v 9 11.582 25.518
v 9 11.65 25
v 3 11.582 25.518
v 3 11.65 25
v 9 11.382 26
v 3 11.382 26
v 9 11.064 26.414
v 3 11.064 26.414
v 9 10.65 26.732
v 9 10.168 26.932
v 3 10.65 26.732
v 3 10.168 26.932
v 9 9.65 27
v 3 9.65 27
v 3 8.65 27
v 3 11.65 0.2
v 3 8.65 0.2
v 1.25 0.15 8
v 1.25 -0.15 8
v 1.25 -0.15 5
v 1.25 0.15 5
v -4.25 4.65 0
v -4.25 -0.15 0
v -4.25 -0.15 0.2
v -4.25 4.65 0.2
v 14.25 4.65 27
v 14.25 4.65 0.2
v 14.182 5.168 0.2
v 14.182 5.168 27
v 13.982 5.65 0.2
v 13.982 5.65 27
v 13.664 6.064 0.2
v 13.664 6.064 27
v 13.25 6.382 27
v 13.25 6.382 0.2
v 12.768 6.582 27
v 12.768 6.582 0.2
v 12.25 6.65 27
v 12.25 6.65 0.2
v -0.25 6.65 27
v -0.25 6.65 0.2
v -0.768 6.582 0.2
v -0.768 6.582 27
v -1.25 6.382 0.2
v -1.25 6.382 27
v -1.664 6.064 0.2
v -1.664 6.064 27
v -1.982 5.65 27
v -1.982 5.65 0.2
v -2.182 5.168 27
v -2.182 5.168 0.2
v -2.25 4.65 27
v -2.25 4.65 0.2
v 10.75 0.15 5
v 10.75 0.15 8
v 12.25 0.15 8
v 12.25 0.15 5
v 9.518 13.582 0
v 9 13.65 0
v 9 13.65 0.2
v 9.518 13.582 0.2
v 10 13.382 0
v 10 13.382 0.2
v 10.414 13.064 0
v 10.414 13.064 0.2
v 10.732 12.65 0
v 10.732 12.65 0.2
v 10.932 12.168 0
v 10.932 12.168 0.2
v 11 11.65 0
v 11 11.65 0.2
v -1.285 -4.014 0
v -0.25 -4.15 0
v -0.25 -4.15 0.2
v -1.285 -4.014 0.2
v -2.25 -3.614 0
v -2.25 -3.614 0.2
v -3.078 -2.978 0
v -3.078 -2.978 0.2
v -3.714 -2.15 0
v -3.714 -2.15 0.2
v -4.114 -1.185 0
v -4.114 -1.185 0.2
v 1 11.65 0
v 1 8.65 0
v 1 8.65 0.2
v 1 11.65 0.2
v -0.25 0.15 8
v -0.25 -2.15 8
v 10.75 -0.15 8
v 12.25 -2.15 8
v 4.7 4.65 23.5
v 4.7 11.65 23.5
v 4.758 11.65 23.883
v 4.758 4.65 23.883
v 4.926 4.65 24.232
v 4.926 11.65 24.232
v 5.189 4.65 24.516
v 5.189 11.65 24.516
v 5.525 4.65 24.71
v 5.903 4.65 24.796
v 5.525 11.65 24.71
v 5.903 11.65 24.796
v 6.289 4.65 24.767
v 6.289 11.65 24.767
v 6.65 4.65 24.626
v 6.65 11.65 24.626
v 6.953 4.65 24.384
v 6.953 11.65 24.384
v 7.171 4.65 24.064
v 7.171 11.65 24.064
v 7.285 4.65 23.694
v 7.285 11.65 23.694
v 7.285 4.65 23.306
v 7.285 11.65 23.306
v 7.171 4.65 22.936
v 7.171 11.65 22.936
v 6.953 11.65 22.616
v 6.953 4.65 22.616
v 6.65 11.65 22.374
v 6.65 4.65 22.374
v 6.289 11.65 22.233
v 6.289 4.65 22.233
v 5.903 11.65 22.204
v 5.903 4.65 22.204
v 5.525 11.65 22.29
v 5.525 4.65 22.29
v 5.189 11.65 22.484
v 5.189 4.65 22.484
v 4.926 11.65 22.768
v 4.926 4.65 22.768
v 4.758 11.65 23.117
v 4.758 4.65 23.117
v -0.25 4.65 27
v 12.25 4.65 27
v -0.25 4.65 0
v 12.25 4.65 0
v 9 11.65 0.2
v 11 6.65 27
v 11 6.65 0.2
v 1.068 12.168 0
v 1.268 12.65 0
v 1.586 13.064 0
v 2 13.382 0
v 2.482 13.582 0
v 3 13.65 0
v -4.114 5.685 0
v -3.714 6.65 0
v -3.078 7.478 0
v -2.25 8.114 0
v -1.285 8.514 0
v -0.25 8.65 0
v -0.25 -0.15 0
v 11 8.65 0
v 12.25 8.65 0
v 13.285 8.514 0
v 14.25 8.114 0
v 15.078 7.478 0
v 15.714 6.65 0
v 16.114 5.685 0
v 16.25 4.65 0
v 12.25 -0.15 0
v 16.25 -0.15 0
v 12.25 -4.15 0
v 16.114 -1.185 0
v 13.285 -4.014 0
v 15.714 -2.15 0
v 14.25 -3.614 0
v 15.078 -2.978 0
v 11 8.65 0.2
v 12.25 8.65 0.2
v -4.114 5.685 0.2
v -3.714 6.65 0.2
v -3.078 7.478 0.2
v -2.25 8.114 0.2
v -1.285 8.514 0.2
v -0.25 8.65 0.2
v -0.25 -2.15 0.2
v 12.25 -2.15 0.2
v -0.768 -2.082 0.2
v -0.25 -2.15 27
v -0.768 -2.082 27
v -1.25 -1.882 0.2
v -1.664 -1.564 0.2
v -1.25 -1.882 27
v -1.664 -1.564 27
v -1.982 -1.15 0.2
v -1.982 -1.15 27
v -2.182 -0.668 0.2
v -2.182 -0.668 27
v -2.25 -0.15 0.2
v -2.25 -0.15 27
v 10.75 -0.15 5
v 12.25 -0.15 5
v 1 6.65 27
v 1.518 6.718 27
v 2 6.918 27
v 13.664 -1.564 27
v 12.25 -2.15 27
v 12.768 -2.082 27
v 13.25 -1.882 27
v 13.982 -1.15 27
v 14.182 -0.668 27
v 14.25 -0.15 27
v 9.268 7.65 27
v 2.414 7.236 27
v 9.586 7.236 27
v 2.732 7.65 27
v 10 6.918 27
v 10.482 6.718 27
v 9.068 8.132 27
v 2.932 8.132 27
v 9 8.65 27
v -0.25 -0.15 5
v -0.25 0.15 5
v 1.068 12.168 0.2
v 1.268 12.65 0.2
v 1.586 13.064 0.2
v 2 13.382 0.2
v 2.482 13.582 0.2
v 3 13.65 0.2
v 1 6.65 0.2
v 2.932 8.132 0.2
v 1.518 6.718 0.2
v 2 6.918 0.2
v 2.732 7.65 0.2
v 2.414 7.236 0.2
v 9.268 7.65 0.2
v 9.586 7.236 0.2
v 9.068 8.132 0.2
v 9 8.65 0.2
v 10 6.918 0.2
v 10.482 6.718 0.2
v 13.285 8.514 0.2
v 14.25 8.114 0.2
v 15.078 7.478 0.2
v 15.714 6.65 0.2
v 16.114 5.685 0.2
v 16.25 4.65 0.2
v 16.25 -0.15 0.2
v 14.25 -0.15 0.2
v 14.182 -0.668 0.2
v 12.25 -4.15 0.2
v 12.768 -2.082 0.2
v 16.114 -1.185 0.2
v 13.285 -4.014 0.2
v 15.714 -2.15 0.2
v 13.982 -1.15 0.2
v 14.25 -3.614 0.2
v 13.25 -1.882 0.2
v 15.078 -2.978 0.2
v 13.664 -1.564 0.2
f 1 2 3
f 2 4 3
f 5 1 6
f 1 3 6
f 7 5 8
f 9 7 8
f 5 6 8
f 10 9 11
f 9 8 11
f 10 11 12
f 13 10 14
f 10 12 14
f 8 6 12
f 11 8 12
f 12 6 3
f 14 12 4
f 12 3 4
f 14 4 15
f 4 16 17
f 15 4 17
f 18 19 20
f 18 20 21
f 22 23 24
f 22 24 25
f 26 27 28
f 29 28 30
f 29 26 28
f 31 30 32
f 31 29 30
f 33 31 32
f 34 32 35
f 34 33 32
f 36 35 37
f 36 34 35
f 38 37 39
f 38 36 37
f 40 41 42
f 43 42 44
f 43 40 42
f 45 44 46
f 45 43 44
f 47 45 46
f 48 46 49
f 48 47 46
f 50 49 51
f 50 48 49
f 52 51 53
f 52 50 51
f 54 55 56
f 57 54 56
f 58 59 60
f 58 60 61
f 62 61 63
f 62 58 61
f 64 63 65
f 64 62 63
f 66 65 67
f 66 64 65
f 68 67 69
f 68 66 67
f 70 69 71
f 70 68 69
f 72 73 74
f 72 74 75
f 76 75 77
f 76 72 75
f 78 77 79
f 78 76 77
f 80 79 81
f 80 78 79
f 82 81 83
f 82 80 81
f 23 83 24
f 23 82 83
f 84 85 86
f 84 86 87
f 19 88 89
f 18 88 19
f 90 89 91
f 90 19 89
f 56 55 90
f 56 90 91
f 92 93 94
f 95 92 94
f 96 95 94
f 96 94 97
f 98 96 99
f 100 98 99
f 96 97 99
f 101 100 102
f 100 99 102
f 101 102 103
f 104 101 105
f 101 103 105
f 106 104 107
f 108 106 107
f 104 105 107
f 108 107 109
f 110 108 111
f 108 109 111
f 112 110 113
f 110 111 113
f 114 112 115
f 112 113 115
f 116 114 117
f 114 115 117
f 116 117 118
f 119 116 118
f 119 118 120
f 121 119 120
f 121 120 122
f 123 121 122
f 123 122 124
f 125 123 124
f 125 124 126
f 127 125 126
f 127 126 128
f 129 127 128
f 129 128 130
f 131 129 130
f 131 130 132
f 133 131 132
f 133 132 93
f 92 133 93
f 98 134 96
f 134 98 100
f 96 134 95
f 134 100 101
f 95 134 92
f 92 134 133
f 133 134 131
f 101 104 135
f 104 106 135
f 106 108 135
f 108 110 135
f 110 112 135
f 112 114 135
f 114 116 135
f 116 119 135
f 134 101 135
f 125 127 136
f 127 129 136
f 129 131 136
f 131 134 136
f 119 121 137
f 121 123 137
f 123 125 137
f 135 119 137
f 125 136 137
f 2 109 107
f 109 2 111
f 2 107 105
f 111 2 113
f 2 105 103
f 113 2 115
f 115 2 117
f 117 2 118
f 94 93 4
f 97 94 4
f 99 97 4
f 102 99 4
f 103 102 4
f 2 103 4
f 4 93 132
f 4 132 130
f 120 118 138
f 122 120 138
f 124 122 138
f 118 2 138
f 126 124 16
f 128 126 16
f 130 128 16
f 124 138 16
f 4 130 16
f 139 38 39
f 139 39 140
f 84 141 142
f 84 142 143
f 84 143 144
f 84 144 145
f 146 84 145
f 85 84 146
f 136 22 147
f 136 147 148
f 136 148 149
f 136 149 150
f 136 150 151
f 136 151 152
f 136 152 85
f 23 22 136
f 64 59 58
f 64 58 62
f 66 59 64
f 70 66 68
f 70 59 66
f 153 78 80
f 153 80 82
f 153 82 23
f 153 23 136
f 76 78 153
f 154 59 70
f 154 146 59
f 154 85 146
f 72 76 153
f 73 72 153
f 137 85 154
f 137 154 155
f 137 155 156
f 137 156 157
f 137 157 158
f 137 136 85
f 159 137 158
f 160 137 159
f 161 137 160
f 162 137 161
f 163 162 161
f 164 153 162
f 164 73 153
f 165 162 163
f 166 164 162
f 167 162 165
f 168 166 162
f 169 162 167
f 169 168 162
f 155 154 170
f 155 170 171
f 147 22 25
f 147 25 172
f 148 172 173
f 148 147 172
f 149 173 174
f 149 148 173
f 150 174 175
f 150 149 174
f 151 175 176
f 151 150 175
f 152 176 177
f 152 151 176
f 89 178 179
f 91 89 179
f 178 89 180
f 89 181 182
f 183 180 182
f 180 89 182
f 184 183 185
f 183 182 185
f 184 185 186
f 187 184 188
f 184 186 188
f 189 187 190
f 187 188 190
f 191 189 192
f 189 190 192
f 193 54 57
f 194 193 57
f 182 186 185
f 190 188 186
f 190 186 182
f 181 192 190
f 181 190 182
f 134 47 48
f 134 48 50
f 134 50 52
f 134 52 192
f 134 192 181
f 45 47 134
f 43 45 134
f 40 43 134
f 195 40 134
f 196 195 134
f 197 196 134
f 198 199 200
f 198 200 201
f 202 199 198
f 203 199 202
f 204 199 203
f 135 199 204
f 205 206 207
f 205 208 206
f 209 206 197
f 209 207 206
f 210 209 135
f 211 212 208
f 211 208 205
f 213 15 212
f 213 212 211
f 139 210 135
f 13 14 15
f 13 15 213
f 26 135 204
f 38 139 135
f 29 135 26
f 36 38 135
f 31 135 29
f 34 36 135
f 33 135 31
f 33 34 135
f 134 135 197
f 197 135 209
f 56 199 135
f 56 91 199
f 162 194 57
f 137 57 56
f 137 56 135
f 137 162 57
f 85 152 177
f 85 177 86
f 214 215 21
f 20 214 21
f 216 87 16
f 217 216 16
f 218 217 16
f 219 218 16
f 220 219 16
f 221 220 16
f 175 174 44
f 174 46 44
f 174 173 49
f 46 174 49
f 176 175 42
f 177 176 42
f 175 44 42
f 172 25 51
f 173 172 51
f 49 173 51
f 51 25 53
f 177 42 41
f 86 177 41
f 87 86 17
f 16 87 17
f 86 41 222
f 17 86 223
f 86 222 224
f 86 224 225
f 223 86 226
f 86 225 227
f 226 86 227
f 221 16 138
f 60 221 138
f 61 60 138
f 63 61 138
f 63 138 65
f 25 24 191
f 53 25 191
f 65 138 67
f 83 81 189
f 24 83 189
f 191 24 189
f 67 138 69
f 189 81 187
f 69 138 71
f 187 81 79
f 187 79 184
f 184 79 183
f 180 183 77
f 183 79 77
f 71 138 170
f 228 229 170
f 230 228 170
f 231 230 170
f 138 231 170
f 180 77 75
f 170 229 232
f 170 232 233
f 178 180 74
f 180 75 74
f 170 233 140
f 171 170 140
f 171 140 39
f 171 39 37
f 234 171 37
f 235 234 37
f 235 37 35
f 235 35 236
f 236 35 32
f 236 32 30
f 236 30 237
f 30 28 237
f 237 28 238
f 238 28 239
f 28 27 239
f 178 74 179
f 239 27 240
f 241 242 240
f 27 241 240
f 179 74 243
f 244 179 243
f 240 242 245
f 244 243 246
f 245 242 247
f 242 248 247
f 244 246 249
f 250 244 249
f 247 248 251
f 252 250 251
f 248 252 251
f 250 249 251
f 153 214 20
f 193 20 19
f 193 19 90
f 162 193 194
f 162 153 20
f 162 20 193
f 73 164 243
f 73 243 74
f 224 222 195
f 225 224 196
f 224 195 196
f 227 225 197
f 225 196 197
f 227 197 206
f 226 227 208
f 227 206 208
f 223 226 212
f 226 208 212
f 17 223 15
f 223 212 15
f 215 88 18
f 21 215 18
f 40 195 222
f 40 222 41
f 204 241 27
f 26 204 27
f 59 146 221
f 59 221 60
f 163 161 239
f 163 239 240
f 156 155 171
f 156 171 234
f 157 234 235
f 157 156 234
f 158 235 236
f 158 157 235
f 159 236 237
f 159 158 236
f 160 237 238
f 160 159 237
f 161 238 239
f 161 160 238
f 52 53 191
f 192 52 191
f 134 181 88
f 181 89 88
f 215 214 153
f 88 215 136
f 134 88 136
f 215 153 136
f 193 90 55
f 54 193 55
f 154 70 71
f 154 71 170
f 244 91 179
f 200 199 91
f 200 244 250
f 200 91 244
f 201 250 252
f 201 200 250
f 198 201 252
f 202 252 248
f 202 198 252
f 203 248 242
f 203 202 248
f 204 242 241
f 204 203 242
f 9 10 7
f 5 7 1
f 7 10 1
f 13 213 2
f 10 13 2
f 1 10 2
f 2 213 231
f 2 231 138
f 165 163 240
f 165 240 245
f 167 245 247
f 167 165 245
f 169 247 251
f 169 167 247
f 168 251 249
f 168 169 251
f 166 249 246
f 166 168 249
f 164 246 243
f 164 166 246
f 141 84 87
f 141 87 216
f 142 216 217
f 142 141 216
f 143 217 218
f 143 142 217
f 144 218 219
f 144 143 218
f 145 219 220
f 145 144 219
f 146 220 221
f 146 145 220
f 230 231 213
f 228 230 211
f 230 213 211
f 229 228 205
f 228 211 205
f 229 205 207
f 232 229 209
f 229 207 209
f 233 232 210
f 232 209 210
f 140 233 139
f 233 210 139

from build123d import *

# Parameters (mm, degrees)
F0_W      = 12.5
F0_H      = 4.8
F1_DEPTH  = 27
F2_W      = 12.5
F2_H      = 6.8
F3_DEPTH  = 19
F4_W      = 1.5
F4_H      = 0.3
F5_DEPTH  = 3
F6_R      = 1.3
F7_DEPTH  = 13.801
F8_R      = 2
F10_DEPTH = 0.2


with BuildPart() as f1:
    # F0 (on Top) → F1 (new body)
    with BuildSketch(Plane.XY):
        Polygon((3, 6.65), (-2.25, 6.65), (-2.25, -2.15), (14.25, -2.15), (14.25, 6.65), (9, 6.65), (9, 11.65), (3, 11.65), align=None)
        with Locations((6, 2.25)):
            Rectangle(F0_W, F0_H, mode=Mode.SUBTRACT)
    extrude(amount=F1_DEPTH)

    # F2 (on face) → F3 (cut)
    with BuildSketch(Plane.XY.offset(27)):
        with Locations((6, 1.25)):
            Rectangle(F2_W, F2_H)
    extrude(amount=-F3_DEPTH, mode=Mode.SUBTRACT)

    # F4 (on face) → F5 (join)
    with BuildSketch(Plane.XY.offset(8)):
        with Locations((0.5, 0)):
            Rectangle(F4_W, F4_H)
        with Locations((11.5, 0)):
            Rectangle(F4_W, F4_H)
    extrude(amount=-F5_DEPTH)

    # F6 (on face) → F7 (cut, through all)
    with BuildSketch(Plane(origin=(0, 11.65, 0), x_dir=(-1, 0, 0), z_dir=(0, 1, 0))):
        with Locations((-6, 23.5)):
            Circle(F6_R)
    extrude(amount=-F7_DEPTH, mode=Mode.SUBTRACT)

    # F8
    f8_edges = [f1.edges().sort_by_distance(p)[0] for p in [
        (9, 6.65, 13.5),
        (3, 6.65, 13.5),
        (-2.25, 6.65, 13.5),
        (-2.25, -2.15, 13.5),
        (14.25, 6.65, 13.5),
        (14.25, -2.15, 13.5),
        (6, 11.65, 27),
    ]]
    fillet(f8_edges, radius=F8_R)

    # F9 (on face) → F10 (join)
    with BuildSketch(Plane(origin=(0, 0, 0), x_dir=(1, 0, 0), z_dir=(0, 0, -1))):
        with BuildLine():
            ThreePointArc((-0.25, 4.15), (-3.0784271247, 2.9784271247), (-4.25, 0.15))
            Line((-4.25, 0.15), (-4.25, -4.65))
            ThreePointArc((-4.25, -4.65), (-3.0784271247, -7.4784271247), (-0.25, -8.65))
            Line((-0.25, -8.65), (1, -8.65))
            Line((1, -8.65), (1, -11.65))
            ThreePointArc((1, -11.65), (1.5857864376, -13.0642135624), (3, -13.65))
            Line((3, -13.65), (9, -13.65))
            ThreePointArc((9, -13.65), (10.4142135624, -13.0642135624), (11, -11.65))
            Line((11, -11.65), (11, -8.65))
            Line((11, -8.65), (12.25, -8.65))
            ThreePointArc((12.25, -8.65), (15.0784271247, -7.4784271247), (16.25, -4.65))
            Line((16.25, -4.65), (16.25, 0.15))
            ThreePointArc((16.25, 0.15), (15.0784271247, 2.9784271247), (12.25, 4.15))
            Line((12.25, 4.15), (-0.25, 4.15))
        make_face()
        with BuildLine():
            ThreePointArc((-0.25, -6.65), (-1.6642135624, -6.0642135624), (-2.25, -4.65))
            Line((-2.25, -4.65), (-2.25, 0.15))
            ThreePointArc((-2.25, 0.15), (-1.6642135624, 1.5642135624), (-0.25, 2.15))
            Line((-0.25, 2.15), (12.25, 2.15))
            ThreePointArc((12.25, 2.15), (13.6642135624, 1.5642135624), (14.25, 0.15))
            Line((14.25, 0.15), (14.25, -4.65))
            ThreePointArc((14.25, -4.65), (13.6642135624, -6.0642135624), (12.25, -6.65))
            Line((12.25, -6.65), (11, -6.65))
            ThreePointArc((11, -6.65), (9.5857864376, -7.2357864376), (9, -8.65))
            Line((9, -8.65), (9, -11.65))
            Line((9, -11.65), (3, -11.65))
            Line((3, -11.65), (3, -8.65))
            ThreePointArc((3, -8.65), (2.4142135624, -7.2357864376), (1, -6.65))
            Line((1, -6.65), (-0.25, -6.65))
        make_face(mode=Mode.SUBTRACT)
    extrude(amount=-F10_DEPTH)


solid = f1.part
